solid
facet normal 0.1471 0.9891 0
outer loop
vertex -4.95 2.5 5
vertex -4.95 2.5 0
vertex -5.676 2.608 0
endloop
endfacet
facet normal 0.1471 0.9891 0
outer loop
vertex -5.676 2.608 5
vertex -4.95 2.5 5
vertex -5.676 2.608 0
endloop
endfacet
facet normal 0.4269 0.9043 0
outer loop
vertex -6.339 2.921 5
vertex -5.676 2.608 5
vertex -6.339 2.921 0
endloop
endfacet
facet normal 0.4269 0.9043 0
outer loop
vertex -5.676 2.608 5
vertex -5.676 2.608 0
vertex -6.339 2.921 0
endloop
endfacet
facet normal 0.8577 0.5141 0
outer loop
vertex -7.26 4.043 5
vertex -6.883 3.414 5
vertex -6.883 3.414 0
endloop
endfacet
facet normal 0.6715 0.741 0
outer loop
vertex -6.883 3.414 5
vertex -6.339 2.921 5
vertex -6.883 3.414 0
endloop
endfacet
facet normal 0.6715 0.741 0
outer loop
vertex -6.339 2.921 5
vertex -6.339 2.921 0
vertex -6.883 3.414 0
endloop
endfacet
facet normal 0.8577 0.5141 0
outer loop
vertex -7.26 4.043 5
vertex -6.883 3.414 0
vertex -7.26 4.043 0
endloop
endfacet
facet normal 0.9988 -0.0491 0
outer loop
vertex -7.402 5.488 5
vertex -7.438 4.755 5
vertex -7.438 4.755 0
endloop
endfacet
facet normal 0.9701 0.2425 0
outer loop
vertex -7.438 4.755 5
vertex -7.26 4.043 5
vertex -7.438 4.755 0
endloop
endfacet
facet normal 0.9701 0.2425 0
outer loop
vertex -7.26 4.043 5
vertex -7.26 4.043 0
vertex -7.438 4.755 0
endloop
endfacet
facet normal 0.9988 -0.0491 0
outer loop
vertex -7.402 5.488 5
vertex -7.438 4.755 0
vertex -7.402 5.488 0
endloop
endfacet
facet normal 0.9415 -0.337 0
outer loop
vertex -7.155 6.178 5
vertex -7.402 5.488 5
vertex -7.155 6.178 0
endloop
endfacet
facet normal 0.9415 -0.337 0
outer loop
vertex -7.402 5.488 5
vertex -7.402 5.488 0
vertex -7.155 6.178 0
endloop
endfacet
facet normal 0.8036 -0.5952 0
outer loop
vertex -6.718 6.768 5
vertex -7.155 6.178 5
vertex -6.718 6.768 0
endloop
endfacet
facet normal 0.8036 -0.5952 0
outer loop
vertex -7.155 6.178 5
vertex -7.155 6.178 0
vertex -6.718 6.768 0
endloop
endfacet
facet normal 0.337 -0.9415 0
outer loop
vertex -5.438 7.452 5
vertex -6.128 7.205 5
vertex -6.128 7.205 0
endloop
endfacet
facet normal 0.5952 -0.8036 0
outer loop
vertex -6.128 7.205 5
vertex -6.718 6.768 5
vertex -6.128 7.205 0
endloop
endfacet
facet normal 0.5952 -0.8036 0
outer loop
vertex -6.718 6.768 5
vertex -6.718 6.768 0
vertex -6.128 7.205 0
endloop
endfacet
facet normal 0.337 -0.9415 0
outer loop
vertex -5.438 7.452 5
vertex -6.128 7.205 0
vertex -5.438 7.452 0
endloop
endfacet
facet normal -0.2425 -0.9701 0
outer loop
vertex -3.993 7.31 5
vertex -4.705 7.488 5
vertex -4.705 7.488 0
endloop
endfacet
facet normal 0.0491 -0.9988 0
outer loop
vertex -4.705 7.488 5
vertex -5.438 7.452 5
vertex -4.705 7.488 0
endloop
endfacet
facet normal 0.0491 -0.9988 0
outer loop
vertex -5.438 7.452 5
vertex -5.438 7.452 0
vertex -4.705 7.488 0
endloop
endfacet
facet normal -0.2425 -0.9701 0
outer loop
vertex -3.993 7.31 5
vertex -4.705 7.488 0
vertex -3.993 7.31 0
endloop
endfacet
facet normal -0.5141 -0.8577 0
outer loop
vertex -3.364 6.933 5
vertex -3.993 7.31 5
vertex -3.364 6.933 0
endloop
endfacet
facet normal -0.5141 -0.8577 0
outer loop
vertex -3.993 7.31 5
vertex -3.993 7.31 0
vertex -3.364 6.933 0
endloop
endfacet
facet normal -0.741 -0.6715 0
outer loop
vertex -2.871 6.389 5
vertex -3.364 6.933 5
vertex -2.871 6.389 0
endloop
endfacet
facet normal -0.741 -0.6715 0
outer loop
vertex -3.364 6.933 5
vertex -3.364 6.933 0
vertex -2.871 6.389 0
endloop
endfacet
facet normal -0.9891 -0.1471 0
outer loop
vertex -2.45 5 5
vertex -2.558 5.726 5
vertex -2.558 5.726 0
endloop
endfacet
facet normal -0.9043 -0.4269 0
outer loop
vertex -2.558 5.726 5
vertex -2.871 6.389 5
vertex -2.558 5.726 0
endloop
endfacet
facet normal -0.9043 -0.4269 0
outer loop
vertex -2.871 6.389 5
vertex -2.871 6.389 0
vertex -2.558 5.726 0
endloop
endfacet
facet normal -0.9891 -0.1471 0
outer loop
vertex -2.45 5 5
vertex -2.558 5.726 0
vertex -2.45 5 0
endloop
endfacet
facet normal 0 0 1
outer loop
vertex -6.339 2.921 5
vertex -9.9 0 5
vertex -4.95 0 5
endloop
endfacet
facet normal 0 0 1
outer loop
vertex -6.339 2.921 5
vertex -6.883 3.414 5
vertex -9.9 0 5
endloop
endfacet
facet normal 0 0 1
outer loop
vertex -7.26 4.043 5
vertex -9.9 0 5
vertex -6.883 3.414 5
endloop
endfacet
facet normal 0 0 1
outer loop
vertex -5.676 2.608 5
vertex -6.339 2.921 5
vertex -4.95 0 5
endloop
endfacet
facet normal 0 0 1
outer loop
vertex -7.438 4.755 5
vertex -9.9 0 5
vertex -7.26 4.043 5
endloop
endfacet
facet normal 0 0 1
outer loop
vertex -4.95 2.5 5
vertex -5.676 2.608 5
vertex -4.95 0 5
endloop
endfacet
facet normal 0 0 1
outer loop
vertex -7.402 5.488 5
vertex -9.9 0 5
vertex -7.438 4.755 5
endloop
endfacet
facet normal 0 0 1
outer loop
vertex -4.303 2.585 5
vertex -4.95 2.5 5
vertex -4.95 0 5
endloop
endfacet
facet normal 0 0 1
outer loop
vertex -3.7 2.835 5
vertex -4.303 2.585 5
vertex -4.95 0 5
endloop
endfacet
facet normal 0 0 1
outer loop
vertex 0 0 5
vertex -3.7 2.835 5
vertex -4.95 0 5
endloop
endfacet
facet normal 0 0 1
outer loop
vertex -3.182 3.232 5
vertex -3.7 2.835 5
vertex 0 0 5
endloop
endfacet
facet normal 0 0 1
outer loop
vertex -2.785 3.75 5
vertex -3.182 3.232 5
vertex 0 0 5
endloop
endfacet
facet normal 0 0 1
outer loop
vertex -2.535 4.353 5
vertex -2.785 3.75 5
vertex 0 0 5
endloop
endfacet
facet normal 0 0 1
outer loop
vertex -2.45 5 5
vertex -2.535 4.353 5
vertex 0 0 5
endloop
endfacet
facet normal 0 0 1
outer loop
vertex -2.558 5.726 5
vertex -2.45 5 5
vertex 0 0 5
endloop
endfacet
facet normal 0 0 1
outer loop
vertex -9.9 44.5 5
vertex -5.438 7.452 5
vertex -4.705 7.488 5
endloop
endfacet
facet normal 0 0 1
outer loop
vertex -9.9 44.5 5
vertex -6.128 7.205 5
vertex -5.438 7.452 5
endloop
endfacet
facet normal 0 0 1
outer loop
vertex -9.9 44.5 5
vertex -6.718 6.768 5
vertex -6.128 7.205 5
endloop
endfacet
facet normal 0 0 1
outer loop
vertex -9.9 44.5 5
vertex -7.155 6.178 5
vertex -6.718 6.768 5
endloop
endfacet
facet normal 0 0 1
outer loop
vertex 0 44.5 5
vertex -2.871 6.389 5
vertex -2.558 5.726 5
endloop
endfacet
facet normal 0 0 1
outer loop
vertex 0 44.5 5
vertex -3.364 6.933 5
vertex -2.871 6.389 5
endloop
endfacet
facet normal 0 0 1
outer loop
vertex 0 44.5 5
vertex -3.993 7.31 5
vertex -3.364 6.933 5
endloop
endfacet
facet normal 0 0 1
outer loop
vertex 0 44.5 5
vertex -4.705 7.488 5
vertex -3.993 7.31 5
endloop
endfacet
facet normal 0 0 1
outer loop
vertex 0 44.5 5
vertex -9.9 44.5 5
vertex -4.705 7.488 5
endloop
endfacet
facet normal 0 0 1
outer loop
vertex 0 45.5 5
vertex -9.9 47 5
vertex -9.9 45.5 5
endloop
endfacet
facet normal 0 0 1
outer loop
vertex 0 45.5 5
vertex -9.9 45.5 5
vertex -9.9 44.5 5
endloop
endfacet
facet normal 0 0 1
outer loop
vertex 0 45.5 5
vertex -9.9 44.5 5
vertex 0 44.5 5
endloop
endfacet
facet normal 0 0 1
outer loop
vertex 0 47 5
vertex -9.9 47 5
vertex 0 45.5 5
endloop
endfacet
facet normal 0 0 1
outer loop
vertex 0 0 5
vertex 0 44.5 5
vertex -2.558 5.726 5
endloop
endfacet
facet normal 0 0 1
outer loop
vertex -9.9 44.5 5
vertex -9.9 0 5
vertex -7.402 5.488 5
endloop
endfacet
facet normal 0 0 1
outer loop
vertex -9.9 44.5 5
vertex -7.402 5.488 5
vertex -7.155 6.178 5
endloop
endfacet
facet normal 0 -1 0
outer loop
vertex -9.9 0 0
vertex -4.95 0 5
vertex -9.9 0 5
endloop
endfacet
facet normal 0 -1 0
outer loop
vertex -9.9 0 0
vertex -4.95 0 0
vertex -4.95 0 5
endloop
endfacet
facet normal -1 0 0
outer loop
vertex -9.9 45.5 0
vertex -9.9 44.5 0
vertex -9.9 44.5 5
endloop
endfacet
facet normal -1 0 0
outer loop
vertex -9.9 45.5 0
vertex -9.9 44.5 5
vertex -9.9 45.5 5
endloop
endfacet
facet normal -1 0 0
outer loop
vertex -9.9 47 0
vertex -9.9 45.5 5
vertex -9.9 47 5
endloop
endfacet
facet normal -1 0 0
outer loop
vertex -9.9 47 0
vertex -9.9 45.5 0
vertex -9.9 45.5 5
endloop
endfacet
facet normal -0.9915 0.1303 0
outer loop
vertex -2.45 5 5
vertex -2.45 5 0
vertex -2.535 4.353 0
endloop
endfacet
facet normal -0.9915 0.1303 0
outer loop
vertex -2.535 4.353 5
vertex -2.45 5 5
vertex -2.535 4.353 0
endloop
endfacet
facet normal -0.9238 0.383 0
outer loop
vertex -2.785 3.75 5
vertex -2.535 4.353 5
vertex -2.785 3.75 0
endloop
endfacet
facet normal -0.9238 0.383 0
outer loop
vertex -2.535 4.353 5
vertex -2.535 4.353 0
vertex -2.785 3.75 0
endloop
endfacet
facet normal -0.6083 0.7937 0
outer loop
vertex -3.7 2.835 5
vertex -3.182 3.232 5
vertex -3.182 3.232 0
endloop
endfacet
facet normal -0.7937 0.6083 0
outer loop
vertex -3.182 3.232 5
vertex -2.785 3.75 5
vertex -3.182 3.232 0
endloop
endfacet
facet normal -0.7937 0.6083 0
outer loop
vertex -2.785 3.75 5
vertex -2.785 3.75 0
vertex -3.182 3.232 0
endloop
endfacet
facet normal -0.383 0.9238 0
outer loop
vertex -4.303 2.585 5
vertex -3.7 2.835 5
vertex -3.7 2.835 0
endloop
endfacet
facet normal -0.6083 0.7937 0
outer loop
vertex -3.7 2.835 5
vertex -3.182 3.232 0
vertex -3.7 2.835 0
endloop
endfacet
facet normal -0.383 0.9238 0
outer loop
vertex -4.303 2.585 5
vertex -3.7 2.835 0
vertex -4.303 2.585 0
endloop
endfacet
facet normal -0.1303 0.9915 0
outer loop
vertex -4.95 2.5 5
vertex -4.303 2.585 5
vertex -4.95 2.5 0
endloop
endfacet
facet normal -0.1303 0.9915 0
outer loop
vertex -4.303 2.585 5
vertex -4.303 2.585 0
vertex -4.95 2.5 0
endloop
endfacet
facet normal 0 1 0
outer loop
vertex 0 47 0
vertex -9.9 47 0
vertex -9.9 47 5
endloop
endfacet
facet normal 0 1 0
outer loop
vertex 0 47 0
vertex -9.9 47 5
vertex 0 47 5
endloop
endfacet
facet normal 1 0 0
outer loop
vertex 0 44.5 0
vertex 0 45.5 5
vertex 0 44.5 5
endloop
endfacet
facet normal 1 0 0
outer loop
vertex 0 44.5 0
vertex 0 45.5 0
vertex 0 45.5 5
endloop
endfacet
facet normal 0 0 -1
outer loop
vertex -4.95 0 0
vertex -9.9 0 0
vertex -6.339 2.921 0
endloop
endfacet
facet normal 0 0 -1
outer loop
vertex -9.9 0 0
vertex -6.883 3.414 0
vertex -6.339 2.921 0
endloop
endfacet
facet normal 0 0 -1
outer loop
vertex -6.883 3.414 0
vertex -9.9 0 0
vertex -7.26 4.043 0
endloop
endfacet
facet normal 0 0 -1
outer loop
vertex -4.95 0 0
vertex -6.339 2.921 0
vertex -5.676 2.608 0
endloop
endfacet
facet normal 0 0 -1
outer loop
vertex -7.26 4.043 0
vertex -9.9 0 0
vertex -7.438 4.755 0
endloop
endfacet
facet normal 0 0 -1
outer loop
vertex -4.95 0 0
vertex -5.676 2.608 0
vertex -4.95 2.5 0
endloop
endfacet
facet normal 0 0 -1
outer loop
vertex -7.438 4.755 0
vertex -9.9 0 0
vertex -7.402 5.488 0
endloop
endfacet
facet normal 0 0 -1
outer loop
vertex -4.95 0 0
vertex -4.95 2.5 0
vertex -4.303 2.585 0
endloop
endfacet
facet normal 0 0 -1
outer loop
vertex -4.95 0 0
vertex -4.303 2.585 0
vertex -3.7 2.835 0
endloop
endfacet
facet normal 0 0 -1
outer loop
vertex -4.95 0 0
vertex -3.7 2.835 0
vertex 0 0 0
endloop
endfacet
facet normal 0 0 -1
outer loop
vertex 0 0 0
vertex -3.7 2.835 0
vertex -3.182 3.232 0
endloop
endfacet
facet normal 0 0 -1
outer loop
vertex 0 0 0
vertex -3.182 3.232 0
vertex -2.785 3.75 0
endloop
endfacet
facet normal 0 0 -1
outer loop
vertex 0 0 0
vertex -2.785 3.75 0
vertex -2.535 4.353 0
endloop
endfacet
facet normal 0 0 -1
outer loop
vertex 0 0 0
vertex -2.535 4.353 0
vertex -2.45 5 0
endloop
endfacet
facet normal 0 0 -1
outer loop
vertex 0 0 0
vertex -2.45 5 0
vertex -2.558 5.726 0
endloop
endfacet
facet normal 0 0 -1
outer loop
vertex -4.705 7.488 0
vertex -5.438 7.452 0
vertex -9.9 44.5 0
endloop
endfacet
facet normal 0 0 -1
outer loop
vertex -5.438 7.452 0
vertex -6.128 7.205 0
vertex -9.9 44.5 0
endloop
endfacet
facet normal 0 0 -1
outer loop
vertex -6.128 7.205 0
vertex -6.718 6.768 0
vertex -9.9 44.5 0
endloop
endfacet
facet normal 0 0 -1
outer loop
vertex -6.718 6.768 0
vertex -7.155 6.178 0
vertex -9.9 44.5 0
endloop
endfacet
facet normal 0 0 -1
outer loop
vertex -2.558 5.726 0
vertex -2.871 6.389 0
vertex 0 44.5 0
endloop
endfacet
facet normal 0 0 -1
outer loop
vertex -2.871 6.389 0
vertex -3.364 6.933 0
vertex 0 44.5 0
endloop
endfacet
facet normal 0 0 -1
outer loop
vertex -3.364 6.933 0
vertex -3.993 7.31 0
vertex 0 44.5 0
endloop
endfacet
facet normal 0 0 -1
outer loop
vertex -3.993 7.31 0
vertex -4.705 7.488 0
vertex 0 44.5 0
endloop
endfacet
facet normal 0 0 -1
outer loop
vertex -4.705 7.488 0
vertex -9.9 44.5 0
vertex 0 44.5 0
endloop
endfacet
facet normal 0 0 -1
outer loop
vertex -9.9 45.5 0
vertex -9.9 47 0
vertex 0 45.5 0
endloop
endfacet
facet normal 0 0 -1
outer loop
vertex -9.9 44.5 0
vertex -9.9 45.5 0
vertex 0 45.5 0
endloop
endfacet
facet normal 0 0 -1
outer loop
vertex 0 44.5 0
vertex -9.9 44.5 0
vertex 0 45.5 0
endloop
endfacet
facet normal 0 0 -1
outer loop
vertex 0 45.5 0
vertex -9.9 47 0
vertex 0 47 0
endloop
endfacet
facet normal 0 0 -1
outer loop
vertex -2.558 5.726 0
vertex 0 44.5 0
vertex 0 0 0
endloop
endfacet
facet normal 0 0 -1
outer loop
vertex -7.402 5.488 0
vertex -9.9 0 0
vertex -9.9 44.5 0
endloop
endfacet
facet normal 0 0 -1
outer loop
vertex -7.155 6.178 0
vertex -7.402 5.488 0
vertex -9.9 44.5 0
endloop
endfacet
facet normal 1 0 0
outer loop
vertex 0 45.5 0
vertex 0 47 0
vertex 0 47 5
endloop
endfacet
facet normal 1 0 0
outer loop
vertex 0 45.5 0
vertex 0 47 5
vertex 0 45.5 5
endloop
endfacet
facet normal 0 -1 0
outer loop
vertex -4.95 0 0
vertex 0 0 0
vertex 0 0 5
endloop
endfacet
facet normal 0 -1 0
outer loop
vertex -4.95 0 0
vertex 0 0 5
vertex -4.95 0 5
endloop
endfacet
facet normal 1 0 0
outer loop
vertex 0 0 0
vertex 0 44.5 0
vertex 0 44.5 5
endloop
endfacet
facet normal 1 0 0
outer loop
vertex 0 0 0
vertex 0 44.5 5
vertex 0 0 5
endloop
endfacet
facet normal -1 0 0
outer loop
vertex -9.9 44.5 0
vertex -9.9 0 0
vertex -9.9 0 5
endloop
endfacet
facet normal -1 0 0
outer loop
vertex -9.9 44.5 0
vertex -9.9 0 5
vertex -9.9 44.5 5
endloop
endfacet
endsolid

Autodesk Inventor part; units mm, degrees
ref_plane "YZ Plane" through (0, 0, 0) normal (1, 0, 0) x (0, 1, 0)
ref_plane "XZ Plane" through (0, 0, 0) normal (0, 1, 0) x (-1, 0, 0)
ref_plane "XY Plane" through (0, 0, 0) normal (0, 0, 1) x (1, 0, 0)
sketch "Sketch2" plane through (0, 0, 0) normal (0, 0, 1) x (1, 0, 0)
  line L0 (0, 0) -> (-9.9, 0)
  line L1 (-9.9, 0) -> (-9.9, 105)
  line L2 (-9.9, 105) -> (0, 105)
  line L3 (0, 105) -> (0, 0)
  line L4 (-4.95, 0) -> (-4.95, 2.5)
  line L5 (-4.95, 0) -> (-2.45, 0) construction
  circle A0 centre (-4.95, 5) radius 2.5
  line L6 (-4.95, 7.5) -> (32.05, 7.5) construction
  line L7 (0, 44.5) -> (0, 0)
  line L8 (0, 0) -> (-9.9, 0)
  line L9 (-9.9, 0) -> (-9.9, 44.5)
  line L10 (0, 45.5) -> (0, 0)
  line L11 (0, 0) -> (-9.9, 0)
  line L12 (-9.9, 0) -> (-9.9, 45.5)
  line L13 (-4.95, 7.5) -> (66.05, 7.5) construction
  line L14 (-9.9, 78.5) -> (0, 78.5)
  line L15 (0, 0) -> (-9.9, 0)
  line L16 (-9.9, 0) -> (-9.9, 47)
  line L17 (-9.9, 47) -> (0, 47)
  line L18 (0, 47) -> (0, 0)
  dimension "d35" = 5
  dimension "d4" = 9.9
  dimension "d5" = 105
  dimension "d33" = 2.5
  dimension "d34" = 90
  dimension "d46" = 9.9
  dimension "d47" = 47
extrude "Extrusion6" add sketch "Sketch2" along normal blind 5 contours L0 L1 L17 L3
properties part number "Elbow_Cube_Holder_TestFit_V2"
